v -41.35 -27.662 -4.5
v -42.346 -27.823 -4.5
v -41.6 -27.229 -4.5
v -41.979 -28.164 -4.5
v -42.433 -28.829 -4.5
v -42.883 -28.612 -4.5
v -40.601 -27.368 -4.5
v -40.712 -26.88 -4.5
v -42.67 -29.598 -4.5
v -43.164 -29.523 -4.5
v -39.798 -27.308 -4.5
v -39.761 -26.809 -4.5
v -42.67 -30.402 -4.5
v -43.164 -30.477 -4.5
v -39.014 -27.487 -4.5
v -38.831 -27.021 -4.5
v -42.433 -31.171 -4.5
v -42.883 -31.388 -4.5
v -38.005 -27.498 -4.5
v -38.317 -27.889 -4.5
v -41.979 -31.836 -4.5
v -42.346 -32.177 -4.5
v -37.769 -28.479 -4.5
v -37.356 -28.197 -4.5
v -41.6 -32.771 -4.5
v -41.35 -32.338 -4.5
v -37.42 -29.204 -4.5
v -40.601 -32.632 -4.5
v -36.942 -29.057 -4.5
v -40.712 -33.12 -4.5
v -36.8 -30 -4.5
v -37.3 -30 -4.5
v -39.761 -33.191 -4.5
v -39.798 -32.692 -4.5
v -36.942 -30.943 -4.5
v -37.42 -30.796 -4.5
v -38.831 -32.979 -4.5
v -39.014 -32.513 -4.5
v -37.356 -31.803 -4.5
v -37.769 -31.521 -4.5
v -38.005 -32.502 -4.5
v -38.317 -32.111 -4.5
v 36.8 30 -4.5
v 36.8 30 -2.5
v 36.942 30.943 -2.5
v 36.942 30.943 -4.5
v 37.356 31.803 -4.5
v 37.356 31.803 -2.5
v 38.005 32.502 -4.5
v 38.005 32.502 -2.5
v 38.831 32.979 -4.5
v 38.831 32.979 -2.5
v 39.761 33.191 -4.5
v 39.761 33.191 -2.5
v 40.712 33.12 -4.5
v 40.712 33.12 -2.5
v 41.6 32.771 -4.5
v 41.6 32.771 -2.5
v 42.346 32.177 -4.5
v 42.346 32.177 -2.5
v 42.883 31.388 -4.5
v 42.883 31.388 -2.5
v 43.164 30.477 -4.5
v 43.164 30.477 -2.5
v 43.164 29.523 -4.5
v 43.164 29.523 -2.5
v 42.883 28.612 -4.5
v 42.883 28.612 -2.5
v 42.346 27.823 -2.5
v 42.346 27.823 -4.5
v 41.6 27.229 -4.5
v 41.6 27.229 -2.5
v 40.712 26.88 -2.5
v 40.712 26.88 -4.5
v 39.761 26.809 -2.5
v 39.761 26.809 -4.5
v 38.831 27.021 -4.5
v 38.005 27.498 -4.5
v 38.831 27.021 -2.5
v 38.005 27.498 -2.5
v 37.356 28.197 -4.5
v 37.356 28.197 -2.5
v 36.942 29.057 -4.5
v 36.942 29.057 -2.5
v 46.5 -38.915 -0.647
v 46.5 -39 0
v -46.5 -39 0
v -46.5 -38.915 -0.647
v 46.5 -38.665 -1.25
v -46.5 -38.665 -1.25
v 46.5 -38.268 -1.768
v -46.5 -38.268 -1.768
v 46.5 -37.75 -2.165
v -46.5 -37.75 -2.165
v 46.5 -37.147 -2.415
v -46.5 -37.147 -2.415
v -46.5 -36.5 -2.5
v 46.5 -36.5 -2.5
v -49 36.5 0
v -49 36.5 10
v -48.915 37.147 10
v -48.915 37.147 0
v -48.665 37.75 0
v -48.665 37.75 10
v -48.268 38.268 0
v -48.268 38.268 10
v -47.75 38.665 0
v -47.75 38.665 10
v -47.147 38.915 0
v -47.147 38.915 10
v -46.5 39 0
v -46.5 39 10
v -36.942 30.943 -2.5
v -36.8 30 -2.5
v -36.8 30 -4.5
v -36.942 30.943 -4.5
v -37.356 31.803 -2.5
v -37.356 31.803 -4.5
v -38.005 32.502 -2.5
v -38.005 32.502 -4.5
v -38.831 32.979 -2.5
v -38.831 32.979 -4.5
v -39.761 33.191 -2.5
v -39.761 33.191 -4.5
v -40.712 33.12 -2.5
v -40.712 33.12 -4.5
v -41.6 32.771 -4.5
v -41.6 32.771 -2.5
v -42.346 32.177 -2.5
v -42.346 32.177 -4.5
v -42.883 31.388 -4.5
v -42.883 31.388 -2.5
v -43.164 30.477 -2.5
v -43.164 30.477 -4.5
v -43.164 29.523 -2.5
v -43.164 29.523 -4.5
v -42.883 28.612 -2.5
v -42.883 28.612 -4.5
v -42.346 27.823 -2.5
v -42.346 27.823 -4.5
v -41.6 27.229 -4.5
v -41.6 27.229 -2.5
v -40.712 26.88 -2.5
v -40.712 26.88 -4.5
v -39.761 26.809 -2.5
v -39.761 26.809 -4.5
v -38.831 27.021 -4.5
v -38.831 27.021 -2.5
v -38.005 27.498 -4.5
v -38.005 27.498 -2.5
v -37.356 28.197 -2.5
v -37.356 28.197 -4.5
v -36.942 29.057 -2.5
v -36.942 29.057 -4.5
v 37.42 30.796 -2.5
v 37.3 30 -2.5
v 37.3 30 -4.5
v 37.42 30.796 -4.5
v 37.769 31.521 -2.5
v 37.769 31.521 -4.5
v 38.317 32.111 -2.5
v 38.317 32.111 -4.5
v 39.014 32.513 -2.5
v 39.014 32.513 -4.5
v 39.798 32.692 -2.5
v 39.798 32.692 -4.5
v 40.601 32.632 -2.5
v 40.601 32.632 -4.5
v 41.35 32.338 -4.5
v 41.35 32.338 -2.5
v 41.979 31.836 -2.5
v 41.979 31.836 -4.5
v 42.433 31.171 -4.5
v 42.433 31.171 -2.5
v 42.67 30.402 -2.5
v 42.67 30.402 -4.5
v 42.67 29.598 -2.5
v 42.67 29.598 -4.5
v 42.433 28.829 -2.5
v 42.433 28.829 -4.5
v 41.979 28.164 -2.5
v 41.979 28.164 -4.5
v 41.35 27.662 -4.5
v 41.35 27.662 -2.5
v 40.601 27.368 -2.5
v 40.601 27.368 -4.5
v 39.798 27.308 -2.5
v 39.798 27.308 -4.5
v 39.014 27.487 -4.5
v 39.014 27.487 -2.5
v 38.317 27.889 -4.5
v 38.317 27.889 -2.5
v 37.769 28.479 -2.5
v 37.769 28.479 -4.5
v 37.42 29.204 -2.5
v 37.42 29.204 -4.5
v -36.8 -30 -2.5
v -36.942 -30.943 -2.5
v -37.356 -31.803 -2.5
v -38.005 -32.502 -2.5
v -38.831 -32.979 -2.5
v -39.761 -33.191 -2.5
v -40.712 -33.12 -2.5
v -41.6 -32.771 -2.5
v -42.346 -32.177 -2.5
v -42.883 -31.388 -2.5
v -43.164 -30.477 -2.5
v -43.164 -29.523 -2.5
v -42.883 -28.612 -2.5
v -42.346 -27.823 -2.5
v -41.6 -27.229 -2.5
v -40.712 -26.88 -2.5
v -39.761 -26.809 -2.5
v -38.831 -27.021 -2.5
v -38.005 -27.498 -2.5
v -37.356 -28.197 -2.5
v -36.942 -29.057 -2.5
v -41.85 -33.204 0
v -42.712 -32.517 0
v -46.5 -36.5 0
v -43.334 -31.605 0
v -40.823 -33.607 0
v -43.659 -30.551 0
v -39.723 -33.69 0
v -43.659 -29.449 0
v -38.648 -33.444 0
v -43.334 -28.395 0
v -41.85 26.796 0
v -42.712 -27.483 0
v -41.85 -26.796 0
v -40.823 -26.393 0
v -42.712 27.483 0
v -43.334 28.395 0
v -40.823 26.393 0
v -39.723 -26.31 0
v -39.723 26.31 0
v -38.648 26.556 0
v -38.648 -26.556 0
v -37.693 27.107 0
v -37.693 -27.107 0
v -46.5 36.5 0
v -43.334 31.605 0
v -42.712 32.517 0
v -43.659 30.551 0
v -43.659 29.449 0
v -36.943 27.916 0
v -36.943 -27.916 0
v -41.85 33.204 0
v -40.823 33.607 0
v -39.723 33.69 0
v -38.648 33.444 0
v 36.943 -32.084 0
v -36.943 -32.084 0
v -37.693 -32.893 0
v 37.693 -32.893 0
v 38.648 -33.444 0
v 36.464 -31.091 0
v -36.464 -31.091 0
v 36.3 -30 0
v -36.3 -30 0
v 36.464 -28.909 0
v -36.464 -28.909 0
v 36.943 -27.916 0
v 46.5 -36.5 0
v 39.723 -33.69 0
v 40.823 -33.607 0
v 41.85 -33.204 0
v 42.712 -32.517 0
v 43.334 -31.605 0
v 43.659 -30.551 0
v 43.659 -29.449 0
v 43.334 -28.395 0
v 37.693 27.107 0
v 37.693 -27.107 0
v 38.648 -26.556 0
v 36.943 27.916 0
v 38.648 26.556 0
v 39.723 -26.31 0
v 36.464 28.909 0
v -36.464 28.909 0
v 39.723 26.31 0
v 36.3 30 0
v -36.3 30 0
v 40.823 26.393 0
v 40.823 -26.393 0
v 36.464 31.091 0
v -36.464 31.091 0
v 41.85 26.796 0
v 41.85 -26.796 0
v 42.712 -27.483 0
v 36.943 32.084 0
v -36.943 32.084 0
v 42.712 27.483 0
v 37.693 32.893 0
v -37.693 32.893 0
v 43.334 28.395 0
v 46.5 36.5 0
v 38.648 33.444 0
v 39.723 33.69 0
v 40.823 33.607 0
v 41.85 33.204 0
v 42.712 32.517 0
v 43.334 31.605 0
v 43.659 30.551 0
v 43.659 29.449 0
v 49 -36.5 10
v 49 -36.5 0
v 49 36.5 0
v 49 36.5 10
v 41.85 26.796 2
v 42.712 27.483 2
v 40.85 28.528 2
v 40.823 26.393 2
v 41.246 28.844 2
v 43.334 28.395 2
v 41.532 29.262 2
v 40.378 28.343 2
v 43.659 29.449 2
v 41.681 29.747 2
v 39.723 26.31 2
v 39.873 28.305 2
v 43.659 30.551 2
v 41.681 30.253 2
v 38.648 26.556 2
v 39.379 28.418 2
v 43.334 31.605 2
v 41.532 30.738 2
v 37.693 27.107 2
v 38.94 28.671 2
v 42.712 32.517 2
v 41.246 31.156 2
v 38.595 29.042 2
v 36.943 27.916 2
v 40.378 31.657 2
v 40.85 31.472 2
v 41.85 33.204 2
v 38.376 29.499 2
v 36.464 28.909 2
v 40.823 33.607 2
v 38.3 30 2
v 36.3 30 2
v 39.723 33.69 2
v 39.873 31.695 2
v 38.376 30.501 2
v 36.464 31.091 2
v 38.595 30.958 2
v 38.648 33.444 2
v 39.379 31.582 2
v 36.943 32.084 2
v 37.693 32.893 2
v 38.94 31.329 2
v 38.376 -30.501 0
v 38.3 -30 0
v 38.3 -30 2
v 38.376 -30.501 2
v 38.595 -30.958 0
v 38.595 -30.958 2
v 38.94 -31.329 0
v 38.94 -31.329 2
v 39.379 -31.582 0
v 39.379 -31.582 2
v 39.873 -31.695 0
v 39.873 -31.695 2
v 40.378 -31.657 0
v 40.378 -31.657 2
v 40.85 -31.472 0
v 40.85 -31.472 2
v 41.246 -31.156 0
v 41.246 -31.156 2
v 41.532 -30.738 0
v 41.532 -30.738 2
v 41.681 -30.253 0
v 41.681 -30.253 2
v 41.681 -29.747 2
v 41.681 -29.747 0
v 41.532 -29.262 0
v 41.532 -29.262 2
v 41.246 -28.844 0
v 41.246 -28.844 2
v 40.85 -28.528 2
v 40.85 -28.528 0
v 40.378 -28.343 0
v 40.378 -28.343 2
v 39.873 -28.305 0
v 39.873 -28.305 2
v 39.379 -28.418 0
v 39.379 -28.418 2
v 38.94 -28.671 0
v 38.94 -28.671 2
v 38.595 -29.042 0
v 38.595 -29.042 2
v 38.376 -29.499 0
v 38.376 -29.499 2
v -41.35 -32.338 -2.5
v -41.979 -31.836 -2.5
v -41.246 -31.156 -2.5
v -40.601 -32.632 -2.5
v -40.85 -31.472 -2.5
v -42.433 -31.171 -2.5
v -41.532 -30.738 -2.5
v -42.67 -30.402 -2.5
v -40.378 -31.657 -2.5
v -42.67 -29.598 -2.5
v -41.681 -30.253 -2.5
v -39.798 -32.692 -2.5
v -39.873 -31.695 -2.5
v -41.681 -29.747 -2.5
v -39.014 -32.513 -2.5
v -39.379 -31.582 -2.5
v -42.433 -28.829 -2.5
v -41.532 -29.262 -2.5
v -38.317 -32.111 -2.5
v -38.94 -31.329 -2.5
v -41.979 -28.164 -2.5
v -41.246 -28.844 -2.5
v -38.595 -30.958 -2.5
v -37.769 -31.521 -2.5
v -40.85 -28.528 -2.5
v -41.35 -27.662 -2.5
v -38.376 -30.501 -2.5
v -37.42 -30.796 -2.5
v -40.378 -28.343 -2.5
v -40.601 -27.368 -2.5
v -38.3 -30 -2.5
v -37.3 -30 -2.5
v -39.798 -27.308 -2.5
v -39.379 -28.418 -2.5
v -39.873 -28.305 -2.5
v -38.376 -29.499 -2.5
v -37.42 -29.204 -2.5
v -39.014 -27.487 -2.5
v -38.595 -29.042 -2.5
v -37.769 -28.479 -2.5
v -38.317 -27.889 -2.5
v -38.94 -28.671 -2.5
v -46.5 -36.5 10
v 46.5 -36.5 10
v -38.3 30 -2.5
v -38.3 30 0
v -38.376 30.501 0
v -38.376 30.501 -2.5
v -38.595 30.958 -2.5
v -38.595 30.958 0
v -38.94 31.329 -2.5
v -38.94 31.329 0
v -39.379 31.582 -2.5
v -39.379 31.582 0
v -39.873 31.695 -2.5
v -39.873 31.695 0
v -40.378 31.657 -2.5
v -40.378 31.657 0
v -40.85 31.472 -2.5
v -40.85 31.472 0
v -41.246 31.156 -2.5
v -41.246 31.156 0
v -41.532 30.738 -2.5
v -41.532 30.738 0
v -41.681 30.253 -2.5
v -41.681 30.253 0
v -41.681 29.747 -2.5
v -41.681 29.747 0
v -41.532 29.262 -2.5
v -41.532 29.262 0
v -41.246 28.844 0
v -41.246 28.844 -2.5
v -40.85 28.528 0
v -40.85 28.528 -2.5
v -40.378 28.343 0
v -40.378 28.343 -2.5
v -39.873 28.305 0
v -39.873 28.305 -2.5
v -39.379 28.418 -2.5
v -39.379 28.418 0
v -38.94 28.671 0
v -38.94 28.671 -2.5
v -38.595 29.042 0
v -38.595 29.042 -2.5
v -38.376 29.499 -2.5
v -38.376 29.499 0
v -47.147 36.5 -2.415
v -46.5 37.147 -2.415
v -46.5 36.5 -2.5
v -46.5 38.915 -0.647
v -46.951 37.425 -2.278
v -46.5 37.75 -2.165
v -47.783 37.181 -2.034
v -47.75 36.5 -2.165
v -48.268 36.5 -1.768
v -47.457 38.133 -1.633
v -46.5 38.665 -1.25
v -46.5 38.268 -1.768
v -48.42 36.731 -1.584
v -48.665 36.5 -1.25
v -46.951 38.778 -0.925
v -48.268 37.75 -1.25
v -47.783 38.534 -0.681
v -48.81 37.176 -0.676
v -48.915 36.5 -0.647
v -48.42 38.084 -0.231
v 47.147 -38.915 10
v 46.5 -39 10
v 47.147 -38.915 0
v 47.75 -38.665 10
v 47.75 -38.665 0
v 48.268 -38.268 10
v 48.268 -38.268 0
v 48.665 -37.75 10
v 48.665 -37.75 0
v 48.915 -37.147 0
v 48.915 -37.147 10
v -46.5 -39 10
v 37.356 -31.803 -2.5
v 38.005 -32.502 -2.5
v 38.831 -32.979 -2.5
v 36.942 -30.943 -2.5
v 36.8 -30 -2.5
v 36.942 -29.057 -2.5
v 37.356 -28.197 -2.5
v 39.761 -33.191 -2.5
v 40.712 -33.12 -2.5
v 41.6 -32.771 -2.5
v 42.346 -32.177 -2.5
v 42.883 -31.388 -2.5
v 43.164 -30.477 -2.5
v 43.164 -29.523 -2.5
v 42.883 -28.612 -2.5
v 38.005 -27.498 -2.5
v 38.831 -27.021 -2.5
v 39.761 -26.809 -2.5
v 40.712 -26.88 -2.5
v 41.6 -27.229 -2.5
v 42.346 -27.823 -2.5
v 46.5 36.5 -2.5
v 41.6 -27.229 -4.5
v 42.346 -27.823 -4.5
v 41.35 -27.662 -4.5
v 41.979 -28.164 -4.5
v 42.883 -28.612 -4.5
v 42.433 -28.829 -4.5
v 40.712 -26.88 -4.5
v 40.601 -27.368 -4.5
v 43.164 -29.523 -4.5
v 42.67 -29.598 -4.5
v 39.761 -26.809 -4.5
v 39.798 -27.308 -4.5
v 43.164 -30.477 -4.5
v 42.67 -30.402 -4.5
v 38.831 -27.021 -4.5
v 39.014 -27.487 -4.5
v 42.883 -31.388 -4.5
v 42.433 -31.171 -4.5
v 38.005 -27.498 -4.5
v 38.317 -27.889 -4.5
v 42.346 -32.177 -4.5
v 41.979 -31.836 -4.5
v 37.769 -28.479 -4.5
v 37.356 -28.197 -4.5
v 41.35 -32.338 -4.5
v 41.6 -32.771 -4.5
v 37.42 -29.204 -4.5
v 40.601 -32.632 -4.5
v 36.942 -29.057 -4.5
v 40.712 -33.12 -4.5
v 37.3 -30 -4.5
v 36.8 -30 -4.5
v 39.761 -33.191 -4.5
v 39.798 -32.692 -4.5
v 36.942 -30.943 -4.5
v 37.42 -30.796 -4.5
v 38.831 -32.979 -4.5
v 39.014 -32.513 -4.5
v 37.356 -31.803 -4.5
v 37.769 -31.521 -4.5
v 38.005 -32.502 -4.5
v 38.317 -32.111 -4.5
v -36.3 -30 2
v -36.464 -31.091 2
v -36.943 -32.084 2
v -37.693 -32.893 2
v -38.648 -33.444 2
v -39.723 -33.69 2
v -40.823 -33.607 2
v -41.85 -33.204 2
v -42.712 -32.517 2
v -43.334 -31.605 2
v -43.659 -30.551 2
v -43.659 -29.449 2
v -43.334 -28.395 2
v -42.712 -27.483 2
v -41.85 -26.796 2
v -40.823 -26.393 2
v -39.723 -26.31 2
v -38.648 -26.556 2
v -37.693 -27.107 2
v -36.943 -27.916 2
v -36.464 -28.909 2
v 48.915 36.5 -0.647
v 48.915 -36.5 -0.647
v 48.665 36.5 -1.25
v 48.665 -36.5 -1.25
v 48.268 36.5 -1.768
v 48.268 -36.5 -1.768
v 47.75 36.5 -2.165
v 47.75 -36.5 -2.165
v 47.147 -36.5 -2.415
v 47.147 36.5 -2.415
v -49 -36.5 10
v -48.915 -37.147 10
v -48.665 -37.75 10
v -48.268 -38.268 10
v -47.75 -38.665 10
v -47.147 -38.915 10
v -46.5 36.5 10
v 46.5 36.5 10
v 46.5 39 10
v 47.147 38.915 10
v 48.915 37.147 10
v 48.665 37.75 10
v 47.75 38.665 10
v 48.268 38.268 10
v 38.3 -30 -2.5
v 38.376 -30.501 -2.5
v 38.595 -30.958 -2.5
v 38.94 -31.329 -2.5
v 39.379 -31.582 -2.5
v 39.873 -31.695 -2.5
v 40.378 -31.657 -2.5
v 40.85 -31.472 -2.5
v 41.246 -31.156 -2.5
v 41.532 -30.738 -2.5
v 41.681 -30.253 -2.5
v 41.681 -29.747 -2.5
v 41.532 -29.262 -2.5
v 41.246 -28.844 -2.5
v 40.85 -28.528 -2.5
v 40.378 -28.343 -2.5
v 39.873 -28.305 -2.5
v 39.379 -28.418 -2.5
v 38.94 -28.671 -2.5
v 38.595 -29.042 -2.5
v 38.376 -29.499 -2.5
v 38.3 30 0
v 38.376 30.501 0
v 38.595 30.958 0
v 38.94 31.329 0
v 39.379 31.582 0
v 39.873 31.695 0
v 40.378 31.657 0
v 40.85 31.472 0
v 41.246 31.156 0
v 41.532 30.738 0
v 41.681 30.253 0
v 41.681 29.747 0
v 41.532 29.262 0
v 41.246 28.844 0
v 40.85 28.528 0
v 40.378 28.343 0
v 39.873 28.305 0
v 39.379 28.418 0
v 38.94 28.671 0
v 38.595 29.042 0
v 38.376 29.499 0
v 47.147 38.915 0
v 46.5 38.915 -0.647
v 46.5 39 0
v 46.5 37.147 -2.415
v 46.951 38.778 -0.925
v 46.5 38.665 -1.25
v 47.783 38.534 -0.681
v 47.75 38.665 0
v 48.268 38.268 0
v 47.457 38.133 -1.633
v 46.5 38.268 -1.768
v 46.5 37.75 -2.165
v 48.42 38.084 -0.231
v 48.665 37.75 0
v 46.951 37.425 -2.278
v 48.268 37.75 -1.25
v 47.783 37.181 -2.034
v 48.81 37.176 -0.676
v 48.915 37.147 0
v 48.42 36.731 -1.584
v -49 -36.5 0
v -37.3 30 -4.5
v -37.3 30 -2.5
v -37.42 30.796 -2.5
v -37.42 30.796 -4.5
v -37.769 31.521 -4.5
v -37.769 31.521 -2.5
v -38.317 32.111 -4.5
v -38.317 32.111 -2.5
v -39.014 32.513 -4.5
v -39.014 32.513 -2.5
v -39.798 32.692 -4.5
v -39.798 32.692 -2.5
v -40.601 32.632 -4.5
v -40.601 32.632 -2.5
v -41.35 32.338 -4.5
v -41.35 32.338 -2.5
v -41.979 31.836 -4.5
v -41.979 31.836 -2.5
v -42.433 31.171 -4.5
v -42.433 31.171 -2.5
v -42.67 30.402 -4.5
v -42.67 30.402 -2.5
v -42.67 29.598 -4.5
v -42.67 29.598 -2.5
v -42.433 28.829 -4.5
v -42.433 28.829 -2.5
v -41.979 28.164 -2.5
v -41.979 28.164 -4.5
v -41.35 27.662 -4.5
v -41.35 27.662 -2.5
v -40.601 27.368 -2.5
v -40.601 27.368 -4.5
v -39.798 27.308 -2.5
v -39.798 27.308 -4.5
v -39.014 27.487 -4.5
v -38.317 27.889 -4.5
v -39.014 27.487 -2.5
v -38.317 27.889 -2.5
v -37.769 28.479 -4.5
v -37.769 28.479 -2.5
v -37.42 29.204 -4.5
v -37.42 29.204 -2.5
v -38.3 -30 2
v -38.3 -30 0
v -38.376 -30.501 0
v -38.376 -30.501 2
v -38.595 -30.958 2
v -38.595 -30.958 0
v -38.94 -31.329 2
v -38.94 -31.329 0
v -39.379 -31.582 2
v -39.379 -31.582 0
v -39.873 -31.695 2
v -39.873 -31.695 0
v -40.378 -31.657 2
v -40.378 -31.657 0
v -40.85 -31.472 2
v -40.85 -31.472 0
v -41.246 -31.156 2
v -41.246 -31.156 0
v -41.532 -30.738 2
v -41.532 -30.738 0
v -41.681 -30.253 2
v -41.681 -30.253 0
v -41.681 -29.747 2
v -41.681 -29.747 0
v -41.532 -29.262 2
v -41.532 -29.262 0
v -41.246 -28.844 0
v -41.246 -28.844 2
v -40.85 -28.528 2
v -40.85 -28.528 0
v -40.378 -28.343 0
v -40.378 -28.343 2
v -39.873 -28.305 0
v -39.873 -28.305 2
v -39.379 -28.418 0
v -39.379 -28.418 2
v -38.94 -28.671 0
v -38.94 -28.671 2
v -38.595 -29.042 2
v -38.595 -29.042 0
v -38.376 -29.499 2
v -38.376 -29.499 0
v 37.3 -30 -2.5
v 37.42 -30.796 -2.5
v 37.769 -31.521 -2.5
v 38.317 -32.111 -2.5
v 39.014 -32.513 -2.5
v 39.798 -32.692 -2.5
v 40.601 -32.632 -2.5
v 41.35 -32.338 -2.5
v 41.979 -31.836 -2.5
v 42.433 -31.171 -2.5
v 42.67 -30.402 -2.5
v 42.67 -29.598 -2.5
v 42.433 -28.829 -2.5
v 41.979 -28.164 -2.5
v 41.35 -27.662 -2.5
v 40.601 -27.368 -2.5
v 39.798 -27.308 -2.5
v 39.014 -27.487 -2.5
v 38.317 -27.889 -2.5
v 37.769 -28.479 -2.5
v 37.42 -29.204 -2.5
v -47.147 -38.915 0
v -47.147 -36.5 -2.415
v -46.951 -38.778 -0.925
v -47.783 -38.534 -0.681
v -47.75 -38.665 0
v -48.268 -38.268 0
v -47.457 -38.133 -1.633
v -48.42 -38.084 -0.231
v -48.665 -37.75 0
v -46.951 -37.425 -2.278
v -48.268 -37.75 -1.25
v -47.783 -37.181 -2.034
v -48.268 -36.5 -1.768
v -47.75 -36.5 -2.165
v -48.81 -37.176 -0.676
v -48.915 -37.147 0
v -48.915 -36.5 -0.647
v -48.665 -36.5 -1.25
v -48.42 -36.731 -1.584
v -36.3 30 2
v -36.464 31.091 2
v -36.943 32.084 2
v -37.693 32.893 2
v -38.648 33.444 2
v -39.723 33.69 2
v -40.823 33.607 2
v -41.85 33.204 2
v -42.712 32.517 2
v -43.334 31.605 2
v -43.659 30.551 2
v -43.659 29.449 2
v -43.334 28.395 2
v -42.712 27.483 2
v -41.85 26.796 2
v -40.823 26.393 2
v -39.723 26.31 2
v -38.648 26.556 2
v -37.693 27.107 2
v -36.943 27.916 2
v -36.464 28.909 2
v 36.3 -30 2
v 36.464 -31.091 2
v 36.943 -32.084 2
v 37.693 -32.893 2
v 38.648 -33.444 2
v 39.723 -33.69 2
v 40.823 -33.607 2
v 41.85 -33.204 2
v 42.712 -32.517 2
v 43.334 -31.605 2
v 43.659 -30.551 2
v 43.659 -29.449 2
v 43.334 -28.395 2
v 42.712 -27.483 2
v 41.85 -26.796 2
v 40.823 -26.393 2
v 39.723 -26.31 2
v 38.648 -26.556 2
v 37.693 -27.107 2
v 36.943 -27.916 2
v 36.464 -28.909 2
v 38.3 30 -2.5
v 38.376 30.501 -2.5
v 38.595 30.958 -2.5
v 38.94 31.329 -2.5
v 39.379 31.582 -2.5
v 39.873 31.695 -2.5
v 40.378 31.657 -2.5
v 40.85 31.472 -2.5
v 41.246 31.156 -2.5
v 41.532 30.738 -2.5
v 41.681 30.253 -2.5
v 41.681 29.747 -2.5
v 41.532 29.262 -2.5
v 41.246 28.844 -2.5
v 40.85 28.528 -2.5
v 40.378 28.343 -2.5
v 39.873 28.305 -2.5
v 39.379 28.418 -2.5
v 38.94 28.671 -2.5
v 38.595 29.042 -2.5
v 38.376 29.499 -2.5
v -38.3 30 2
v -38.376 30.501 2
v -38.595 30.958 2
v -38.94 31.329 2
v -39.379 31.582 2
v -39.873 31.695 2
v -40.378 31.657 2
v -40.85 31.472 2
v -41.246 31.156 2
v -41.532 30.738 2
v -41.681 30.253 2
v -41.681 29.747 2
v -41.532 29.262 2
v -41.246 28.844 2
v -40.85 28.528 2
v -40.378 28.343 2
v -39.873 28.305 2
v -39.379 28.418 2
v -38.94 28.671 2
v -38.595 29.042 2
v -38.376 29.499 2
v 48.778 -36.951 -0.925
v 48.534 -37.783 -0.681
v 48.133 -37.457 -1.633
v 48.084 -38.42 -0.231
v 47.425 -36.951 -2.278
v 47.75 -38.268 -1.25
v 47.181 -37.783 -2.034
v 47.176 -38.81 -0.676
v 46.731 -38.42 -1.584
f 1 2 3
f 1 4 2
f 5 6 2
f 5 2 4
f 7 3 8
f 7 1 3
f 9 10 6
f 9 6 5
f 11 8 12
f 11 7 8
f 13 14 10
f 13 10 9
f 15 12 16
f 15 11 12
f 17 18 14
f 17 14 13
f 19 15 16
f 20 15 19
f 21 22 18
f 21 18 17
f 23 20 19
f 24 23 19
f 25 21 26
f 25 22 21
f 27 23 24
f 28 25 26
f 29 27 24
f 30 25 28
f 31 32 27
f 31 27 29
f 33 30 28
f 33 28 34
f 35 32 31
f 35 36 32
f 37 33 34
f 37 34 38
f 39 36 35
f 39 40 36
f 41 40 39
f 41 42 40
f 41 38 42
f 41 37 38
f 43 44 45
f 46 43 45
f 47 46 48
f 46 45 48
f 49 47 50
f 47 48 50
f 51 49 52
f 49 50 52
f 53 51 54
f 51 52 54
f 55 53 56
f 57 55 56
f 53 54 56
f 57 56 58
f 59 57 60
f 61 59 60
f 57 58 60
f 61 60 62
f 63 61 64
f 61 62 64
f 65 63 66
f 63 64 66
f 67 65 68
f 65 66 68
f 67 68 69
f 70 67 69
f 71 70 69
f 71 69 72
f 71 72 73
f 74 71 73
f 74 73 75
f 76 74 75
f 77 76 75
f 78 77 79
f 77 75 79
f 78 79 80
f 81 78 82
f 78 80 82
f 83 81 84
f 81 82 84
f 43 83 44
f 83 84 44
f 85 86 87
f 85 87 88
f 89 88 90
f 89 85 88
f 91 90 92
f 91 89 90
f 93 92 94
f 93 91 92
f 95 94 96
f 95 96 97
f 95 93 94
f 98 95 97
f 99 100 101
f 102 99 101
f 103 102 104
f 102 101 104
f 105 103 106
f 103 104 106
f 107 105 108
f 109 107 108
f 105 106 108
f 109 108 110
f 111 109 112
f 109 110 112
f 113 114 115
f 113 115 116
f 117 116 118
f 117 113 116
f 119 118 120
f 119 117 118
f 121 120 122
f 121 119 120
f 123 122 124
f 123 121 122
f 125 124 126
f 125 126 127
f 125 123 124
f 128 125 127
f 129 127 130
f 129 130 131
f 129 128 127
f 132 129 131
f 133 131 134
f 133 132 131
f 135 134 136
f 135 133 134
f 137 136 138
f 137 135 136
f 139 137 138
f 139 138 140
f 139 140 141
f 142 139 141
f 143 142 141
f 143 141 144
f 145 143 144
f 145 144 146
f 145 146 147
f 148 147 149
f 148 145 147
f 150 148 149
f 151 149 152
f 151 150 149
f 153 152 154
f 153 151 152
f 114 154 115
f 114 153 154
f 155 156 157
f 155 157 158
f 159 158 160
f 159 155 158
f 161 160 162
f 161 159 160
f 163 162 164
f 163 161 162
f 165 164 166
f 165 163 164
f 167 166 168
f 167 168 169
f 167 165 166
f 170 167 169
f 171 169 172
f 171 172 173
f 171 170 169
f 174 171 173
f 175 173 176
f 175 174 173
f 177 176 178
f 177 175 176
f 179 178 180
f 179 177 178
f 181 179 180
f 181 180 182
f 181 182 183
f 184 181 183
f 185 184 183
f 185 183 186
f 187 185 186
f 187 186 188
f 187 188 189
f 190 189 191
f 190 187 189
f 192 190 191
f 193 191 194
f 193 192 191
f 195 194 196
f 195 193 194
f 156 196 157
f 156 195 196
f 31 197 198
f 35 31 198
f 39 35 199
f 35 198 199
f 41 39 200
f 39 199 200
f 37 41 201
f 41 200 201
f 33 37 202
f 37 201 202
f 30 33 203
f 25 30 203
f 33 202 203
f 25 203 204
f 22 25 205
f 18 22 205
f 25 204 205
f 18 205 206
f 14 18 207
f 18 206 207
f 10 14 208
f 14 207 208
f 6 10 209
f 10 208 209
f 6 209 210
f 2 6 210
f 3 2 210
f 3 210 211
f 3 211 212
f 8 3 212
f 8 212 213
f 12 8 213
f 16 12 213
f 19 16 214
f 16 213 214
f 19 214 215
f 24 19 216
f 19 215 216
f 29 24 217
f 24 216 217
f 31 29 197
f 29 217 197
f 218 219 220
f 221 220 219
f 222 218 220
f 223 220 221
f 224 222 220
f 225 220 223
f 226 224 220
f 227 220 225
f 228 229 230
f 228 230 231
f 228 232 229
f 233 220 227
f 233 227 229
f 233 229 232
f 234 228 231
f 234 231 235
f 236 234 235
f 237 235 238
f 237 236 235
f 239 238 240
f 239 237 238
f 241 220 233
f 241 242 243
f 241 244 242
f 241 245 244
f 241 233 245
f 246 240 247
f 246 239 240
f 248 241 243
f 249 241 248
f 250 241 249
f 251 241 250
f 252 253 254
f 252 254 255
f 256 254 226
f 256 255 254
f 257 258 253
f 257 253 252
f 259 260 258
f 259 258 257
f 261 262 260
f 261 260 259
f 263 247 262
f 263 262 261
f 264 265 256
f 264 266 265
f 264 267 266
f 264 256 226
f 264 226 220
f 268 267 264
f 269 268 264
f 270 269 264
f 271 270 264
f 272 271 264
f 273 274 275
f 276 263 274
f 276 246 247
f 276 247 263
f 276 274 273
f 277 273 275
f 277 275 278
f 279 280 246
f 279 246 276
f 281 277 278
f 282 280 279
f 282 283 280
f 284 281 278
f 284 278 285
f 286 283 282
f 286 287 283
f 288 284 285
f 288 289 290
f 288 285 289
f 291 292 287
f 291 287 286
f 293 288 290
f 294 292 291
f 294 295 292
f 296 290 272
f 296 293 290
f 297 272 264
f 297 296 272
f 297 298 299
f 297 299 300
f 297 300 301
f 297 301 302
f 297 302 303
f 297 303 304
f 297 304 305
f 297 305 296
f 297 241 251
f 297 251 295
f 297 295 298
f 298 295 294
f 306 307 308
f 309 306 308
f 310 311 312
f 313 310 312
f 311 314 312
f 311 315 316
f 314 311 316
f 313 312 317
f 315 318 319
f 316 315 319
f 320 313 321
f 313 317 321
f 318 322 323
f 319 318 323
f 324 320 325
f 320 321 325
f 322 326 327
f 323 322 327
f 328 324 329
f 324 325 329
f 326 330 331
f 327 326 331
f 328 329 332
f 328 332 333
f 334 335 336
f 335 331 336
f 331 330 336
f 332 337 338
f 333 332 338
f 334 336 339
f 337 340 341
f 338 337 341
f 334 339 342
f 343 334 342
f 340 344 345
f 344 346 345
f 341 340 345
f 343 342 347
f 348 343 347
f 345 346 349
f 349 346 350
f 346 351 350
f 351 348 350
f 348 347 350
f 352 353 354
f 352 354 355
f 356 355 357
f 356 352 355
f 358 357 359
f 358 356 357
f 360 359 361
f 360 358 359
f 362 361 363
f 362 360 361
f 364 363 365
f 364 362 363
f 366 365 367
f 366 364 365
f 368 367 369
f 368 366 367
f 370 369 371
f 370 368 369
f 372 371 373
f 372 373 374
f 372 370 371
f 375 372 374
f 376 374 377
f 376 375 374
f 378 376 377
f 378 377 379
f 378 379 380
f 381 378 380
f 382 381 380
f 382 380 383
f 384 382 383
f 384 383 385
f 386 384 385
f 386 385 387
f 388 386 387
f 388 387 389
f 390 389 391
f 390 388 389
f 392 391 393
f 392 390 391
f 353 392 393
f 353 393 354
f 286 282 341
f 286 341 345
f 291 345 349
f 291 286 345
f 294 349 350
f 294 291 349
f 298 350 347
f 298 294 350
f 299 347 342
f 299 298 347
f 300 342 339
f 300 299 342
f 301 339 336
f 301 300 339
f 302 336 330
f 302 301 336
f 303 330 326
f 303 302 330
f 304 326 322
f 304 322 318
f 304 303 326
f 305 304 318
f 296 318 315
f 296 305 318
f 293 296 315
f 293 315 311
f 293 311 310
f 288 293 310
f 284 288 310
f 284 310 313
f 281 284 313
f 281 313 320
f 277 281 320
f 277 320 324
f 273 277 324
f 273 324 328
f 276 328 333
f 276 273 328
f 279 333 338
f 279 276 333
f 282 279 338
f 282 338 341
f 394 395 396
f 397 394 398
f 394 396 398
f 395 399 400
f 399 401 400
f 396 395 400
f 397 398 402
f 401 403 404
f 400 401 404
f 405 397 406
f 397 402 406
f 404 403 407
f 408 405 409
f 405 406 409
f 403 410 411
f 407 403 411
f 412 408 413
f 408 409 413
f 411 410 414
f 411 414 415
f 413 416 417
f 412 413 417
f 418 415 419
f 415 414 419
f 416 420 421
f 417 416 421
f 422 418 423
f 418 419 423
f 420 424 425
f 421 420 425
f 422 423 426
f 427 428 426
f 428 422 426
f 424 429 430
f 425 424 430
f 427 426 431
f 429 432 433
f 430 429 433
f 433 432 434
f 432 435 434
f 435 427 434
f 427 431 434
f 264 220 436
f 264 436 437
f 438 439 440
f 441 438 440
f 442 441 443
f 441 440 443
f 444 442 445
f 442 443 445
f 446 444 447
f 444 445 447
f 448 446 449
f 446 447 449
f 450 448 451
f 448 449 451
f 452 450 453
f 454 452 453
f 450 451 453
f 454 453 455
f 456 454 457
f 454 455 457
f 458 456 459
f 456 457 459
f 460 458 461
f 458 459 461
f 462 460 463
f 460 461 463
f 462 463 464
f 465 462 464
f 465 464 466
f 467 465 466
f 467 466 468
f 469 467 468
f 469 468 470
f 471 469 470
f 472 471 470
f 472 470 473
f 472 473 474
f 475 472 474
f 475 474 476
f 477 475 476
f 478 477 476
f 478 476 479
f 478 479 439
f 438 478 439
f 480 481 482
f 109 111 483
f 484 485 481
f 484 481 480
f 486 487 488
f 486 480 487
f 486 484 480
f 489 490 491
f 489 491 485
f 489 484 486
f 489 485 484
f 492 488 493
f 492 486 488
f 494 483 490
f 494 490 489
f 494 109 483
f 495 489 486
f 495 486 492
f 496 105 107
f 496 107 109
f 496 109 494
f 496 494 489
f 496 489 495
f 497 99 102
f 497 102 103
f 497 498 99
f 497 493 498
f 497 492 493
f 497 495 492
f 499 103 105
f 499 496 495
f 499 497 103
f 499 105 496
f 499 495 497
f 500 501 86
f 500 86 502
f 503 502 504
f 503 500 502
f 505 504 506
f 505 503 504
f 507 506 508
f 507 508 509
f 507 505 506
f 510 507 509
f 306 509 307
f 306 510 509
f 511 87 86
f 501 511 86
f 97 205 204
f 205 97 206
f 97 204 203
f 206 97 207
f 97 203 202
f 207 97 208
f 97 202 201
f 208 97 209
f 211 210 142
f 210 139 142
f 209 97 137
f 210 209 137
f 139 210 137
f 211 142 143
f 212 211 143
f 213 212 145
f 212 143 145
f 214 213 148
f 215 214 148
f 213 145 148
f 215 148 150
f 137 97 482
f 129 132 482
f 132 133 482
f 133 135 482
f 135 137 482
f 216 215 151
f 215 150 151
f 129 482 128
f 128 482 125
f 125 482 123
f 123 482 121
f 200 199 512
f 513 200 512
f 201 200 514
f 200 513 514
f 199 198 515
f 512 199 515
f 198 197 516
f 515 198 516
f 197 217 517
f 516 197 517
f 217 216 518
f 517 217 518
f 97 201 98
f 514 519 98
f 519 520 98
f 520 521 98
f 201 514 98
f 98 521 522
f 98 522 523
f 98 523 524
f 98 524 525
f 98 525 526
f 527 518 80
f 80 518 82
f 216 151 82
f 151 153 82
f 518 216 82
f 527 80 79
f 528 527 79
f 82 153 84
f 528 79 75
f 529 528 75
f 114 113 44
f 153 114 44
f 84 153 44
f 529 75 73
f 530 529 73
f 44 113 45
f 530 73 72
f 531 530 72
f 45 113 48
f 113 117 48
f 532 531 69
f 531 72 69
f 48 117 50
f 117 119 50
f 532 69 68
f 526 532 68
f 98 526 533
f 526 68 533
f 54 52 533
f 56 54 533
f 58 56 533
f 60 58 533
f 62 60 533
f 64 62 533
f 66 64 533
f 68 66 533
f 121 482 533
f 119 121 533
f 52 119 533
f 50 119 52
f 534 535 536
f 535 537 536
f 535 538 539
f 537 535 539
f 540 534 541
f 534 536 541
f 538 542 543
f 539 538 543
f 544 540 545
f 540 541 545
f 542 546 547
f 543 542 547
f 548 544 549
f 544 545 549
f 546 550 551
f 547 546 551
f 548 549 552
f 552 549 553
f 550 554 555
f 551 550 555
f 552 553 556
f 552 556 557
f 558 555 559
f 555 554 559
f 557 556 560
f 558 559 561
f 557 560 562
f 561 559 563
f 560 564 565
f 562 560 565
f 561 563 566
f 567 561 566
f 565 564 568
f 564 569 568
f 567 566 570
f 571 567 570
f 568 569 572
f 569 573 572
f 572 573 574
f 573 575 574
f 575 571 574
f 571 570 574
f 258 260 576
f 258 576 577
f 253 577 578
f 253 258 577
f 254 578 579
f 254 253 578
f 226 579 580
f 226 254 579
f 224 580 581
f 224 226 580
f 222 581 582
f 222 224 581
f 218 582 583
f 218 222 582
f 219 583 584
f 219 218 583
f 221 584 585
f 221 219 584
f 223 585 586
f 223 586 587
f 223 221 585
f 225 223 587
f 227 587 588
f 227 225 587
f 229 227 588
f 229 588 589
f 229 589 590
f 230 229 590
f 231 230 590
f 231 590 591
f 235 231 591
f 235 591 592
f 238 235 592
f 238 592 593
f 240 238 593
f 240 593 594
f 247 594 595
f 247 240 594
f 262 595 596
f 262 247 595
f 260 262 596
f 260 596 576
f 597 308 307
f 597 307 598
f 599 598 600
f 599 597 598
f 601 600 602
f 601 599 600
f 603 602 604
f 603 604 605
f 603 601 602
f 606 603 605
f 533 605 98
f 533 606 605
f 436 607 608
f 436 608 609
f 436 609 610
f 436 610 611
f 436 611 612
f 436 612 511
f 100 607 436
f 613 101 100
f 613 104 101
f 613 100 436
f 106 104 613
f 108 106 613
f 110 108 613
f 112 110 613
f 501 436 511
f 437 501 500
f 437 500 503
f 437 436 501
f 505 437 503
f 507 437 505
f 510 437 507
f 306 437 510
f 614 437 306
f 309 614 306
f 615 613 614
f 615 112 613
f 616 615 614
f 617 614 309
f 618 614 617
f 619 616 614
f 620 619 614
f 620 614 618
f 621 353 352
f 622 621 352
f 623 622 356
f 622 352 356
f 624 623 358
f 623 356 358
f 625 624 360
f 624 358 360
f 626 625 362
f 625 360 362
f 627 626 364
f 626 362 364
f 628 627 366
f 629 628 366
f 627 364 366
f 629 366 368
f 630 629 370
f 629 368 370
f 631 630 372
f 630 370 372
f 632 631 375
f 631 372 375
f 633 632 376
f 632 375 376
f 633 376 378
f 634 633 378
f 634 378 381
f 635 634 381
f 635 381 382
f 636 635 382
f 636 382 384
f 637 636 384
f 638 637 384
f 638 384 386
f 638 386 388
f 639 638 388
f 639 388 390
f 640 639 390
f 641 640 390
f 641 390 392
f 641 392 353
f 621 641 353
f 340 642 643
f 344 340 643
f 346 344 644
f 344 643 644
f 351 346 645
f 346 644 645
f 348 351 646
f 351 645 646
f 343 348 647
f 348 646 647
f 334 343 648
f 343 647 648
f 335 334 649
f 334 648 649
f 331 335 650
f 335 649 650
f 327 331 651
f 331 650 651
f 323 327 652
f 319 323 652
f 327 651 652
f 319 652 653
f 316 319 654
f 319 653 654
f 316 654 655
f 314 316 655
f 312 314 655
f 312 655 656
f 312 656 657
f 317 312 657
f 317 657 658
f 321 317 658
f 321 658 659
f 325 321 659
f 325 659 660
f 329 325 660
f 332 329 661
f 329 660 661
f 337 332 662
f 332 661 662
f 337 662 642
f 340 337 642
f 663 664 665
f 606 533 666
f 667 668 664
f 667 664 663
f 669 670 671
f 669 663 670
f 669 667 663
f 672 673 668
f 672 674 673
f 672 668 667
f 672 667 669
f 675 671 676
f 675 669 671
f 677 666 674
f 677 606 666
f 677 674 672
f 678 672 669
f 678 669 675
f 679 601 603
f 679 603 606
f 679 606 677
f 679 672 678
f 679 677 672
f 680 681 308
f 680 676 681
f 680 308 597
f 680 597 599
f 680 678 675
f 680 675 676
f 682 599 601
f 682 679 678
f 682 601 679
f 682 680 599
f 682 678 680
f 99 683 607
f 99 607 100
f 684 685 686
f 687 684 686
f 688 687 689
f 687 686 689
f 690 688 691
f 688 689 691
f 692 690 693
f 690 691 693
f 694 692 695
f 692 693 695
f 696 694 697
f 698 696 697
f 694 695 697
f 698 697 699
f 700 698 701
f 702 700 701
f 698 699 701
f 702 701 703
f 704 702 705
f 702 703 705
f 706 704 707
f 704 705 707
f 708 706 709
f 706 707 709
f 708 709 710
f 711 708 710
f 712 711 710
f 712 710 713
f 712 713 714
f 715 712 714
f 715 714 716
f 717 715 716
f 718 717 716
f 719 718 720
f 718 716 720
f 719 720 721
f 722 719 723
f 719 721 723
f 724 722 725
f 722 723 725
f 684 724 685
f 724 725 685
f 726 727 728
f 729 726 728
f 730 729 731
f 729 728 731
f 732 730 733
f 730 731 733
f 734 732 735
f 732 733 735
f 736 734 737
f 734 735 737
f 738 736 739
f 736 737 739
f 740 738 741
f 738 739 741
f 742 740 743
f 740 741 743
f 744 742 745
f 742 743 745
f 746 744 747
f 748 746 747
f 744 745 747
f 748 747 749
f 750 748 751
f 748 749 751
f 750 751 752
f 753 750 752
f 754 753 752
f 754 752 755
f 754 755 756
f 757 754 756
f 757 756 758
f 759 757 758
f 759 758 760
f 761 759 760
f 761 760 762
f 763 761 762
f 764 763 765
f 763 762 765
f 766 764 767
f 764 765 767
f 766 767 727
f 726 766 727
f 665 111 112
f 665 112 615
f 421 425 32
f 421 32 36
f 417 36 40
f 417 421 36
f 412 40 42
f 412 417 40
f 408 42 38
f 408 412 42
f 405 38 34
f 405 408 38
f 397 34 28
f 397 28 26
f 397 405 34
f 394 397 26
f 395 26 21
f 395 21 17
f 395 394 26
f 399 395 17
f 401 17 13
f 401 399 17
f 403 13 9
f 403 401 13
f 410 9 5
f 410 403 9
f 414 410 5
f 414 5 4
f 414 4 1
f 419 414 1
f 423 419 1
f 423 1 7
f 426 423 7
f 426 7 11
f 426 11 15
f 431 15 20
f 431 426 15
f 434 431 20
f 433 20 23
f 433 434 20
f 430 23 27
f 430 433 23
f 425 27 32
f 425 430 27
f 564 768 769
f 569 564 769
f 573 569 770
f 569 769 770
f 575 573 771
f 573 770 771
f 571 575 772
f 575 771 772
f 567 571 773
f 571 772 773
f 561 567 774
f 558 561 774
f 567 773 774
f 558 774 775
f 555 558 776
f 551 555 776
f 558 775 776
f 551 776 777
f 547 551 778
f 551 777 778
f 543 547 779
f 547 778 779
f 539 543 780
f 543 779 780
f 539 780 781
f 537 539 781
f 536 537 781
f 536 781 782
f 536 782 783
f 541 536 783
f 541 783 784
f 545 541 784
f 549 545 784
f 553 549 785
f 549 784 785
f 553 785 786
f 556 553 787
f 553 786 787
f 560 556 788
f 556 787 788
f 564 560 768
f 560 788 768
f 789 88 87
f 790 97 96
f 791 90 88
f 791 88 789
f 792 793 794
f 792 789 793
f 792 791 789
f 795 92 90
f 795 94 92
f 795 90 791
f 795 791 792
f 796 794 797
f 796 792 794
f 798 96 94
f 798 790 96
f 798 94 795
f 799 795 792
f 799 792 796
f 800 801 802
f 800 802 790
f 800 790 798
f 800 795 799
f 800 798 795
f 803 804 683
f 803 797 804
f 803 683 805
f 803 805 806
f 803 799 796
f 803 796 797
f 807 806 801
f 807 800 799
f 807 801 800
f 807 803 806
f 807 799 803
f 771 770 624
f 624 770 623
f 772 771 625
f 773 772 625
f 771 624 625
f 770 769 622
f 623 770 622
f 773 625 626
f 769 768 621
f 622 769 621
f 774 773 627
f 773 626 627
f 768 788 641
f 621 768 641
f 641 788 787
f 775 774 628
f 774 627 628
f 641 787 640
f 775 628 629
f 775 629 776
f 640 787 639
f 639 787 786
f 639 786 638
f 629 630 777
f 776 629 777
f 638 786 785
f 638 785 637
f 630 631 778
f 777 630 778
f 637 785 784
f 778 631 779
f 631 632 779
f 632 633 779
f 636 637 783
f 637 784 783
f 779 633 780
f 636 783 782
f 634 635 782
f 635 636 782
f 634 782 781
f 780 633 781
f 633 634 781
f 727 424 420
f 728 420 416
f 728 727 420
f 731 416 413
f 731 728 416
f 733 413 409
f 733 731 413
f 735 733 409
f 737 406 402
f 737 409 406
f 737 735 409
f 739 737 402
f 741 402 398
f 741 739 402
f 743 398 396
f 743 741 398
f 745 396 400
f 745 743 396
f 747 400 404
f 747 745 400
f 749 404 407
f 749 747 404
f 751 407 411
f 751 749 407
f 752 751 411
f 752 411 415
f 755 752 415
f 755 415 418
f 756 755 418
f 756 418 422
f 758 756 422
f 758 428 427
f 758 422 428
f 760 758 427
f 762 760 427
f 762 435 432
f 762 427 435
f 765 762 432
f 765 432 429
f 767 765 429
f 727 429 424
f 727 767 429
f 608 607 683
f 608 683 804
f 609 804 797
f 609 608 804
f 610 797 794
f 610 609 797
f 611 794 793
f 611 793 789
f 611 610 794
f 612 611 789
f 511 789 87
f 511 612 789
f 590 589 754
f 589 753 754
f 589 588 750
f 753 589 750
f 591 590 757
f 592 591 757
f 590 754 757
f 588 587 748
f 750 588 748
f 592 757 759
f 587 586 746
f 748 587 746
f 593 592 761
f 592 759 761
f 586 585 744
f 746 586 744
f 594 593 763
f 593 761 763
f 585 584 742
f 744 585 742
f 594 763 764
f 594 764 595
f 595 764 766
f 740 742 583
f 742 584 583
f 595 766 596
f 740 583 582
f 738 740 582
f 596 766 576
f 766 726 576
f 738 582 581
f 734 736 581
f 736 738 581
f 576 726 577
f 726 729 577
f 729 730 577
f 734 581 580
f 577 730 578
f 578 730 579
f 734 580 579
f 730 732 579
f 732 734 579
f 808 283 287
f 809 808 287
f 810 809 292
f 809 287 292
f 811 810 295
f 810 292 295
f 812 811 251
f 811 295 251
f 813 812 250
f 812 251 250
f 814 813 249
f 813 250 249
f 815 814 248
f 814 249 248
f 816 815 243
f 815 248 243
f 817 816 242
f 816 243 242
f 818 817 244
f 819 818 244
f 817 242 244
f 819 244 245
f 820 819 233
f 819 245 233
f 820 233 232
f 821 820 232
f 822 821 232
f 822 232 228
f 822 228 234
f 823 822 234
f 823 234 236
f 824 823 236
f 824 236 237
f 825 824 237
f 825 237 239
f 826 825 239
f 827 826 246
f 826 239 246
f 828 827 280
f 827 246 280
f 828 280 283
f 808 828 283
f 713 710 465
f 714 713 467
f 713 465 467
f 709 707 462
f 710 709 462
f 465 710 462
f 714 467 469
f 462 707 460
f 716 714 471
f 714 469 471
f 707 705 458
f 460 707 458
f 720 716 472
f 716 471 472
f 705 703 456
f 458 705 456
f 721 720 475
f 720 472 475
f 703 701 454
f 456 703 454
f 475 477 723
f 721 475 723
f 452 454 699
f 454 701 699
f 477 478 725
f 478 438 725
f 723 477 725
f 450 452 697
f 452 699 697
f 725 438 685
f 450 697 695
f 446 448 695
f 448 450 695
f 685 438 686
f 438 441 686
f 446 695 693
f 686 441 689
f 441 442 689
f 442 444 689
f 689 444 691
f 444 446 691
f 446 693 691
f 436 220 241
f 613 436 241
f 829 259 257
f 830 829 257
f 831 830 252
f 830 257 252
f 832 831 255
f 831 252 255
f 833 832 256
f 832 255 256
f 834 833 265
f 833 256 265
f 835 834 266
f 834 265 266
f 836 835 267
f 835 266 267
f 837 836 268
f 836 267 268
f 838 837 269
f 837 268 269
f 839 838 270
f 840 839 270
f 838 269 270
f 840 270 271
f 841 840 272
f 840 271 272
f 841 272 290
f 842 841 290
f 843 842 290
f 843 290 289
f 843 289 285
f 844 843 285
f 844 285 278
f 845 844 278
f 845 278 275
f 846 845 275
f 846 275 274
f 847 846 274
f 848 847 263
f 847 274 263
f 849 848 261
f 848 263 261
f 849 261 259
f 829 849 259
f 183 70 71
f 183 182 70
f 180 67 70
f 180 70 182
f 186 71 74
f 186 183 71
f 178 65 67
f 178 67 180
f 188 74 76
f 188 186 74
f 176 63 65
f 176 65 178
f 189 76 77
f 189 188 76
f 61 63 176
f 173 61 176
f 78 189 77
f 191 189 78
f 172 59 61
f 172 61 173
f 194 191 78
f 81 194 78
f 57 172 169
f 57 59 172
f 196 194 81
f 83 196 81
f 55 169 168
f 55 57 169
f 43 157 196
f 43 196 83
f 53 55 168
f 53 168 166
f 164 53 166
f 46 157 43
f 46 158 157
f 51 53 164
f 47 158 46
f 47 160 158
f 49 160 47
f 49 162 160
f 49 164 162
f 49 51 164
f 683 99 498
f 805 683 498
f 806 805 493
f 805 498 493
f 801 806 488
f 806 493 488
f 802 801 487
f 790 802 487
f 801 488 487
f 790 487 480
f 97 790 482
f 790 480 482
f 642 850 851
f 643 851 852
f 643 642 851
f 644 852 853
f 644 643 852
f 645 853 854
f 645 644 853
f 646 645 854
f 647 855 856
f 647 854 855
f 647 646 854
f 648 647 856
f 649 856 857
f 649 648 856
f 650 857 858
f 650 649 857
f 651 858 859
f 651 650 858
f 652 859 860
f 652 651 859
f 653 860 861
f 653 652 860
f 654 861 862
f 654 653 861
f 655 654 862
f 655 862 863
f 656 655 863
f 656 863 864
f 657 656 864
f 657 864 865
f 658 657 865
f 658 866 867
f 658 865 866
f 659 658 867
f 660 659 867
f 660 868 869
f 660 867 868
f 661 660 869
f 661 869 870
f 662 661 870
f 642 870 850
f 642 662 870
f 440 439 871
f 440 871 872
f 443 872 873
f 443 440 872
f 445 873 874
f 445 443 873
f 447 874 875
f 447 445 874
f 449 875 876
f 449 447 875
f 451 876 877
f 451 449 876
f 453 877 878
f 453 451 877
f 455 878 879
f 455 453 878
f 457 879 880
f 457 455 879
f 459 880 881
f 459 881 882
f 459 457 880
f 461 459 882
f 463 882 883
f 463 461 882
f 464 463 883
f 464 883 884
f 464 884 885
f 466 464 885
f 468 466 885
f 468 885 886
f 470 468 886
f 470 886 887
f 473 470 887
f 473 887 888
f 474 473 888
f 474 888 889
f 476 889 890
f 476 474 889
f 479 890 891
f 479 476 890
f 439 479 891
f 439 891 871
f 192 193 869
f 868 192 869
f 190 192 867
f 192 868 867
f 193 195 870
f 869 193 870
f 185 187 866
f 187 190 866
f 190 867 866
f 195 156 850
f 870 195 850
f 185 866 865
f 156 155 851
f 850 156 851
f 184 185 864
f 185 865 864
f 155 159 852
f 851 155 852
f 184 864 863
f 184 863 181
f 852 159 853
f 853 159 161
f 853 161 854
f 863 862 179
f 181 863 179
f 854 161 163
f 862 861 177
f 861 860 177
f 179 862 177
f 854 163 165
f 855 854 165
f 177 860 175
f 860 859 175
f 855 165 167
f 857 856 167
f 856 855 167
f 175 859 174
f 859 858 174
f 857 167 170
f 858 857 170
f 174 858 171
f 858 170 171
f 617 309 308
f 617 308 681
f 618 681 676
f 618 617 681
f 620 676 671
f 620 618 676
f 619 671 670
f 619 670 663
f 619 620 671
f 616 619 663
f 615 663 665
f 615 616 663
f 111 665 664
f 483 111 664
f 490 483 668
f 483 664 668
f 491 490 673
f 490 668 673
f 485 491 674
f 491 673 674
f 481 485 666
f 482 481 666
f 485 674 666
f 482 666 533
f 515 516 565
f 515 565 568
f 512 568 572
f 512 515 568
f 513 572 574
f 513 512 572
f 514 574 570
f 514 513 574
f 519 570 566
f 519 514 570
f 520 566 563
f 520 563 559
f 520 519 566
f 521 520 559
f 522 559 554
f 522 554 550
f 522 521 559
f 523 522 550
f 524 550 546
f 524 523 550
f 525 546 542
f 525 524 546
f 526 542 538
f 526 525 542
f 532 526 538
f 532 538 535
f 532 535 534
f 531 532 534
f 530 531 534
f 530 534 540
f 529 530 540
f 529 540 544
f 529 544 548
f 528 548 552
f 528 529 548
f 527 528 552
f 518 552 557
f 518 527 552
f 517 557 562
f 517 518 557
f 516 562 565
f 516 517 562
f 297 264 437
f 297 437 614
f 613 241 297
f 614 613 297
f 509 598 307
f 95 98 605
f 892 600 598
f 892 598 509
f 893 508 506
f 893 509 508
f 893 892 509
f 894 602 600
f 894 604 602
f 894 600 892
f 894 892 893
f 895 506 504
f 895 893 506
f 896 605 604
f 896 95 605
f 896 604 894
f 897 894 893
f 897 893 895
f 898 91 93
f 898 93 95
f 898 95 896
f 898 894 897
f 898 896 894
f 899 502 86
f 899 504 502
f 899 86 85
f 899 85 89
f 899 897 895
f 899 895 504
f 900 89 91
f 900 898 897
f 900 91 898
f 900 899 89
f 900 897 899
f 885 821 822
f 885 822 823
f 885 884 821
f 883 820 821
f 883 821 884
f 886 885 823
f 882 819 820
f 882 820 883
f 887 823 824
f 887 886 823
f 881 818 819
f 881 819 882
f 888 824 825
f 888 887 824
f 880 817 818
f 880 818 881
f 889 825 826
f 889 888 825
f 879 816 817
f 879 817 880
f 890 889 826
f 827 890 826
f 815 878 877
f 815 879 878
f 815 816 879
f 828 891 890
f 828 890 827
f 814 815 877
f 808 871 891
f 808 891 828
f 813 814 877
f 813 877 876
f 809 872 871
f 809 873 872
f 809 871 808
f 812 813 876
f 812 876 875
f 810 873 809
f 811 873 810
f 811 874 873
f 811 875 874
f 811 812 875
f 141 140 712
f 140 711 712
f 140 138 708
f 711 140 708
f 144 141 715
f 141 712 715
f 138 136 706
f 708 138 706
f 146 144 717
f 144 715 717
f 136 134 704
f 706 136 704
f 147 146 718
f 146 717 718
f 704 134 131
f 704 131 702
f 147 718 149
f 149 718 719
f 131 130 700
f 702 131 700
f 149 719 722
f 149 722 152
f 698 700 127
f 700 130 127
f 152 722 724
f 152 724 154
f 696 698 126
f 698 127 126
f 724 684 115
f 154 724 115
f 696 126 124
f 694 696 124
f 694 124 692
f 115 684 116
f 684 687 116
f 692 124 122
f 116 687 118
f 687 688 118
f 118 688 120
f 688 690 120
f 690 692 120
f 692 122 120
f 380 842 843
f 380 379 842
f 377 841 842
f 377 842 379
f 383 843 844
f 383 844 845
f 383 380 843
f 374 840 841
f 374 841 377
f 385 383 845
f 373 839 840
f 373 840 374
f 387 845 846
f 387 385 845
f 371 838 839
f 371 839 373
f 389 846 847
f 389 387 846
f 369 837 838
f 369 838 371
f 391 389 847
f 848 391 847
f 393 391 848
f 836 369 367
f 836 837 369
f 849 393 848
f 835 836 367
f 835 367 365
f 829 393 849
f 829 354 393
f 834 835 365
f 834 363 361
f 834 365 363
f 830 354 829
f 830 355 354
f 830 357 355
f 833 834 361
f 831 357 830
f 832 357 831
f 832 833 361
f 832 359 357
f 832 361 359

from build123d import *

# Parameters (mm, degrees)
SKETCH001_W                 = 93
SKETCH001_H                 = 73
PAD_DEPTH                   = 10
THICKNESS_T                 = 2.5
SKETCH002_R                 = 1.7
HOLE_DEPTH                  = 25
SKETCH003_R                 = 3.7
SKETCH003_R_2               = 1.7
PAD001_DEPTH                = 2
SKETCH003_MIRRORED_2_R      = 3.7
SKETCH003_MIRRORED_2_R_2    = 1.7
PAD001_MIRRORED_2_DEPTH     = 2
SKETCH005_R                 = 1.7
POCKET_DEPTH                = 254.24889
SKETCH005_MIRRORED004_2_R   = 1.7
POCKET_MIRRORED004_2_DEPTH  = 254.24889
SKETCH006_R                 = 3.2
SKETCH006_R_2               = 2.7
PAD003_DEPTH                = 2
SKETCH006_MIRRORED006_2_R   = 3.2
SKETCH006_MIRRORED006_2_R_2 = 2.7
PAD003_MIRRORED006_2_DEPTH  = 2


with BuildPart() as part:
    # Sketch001 → Pad (new body)
    with BuildSketch(Plane.XY):
        Rectangle(SKETCH001_W, SKETCH001_H)
    extrude(amount=PAD_DEPTH)

    # Thickness
    thickness_openings = [part.faces().sort_by_distance(p)[0] for p in [
        (0, 0, 10),
    ]]
    offset(amount=THICKNESS_T, openings=thickness_openings)

    # Sketch002 → Hole (cut)
    with BuildSketch(Plane.XY):
        with Locations((-40, 30)):
            Circle(SKETCH002_R)
    extrude(amount=-HOLE_DEPTH, mode=Mode.SUBTRACT)

    # Sketch003 → Pad001 (join)
    with BuildSketch(Plane.XY):
        with Locations((-40, 30)):
            Circle(SKETCH003_R)
        with Locations((-40, 30)):
            Circle(SKETCH003_R_2, mode=Mode.SUBTRACT)
    pad001 = extrude(amount=PAD001_DEPTH)

    # Sketch003 Mirrored 2 → Pad001 Mirrored 2 (add)
    with BuildSketch(Plane(origin=(0, 0, 0), x_dir=(-1, 0, 0), z_dir=(0, 0, -1))):
        with Locations((-40, 30)):
            Circle(SKETCH003_MIRRORED_2_R)
        with Locations((-40, 30)):
            Circle(SKETCH003_MIRRORED_2_R_2, mode=Mode.SUBTRACT)
    pad001_mirrored_2 = extrude(amount=-PAD001_MIRRORED_2_DEPTH)

    # Mirrored001: Pad001, Pad001 Mirrored 2 across Sketch003 H_Axis
    add(pad001.mirror(Plane.ZX))
    add(pad001_mirrored_2.mirror(Plane.ZX))

    # Sketch005 → Pocket (cut, through all)
    with BuildSketch(Plane.XY):
        with Locations((-40, 30)):
            Circle(SKETCH005_R)
    pocket = extrude(amount=-POCKET_DEPTH, mode=Mode.SUBTRACT)

    # Sketch005 Mirrored004 2 → Pocket Mirrored004 2 (cut, through all)
    with BuildSketch(Plane(origin=(0, 0, 0), x_dir=(-1, 0, 0), z_dir=(0, 0, -1))):
        with Locations((-40, 30)):
            Circle(SKETCH005_MIRRORED004_2_R)
    pocket_mirrored004_2 = extrude(amount=POCKET_MIRRORED004_2_DEPTH, mode=Mode.SUBTRACT)

    # Mirrored005: Pocket, Pocket Mirrored004 2 across Sketch005 H_Axis
    add(pocket.mirror(Plane.ZX), mode=Mode.SUBTRACT)
    add(pocket_mirrored004_2.mirror(Plane.ZX), mode=Mode.SUBTRACT)

    # Sketch006 (on Face35 of MultiTransform002) → Pad003 (join)
    with BuildSketch(Plane(origin=(0, 0, -2.5), x_dir=(1, 0, 0), z_dir=(0, 0, -1))):
        with Locations((-40, 30)):
            Circle(SKETCH006_R)
        with Locations((-40, 30)):
            Circle(SKETCH006_R_2, mode=Mode.SUBTRACT)
    pad003 = extrude(amount=PAD003_DEPTH)

    # Sketch006 Mirrored006 2 → Pad003 Mirrored006 2 (add)
    with BuildSketch(Plane(origin=(0, 0, -2.5), x_dir=(-1, 0, 0), z_dir=(0, 0, 1))):
        with Locations((-40, 30)):
            Circle(SKETCH006_MIRRORED006_2_R)
        with Locations((-40, 30)):
            Circle(SKETCH006_MIRRORED006_2_R_2, mode=Mode.SUBTRACT)
    pad003_mirrored006_2 = extrude(amount=-PAD003_MIRRORED006_2_DEPTH)

    # Mirrored007: Pad003, Pad003 Mirrored006 2 across Sketch006 H_Axis
    add(pad003.mirror(Plane(origin=(0, 0, -2.5), x_dir=(0, 0, -1), z_dir=(0, -1, 0))))
    add(pad003_mirrored006_2.mirror(Plane(origin=(0, 0, -2.5), x_dir=(0, 0, -1), z_dir=(0, -1, 0))))


solid = part.part
